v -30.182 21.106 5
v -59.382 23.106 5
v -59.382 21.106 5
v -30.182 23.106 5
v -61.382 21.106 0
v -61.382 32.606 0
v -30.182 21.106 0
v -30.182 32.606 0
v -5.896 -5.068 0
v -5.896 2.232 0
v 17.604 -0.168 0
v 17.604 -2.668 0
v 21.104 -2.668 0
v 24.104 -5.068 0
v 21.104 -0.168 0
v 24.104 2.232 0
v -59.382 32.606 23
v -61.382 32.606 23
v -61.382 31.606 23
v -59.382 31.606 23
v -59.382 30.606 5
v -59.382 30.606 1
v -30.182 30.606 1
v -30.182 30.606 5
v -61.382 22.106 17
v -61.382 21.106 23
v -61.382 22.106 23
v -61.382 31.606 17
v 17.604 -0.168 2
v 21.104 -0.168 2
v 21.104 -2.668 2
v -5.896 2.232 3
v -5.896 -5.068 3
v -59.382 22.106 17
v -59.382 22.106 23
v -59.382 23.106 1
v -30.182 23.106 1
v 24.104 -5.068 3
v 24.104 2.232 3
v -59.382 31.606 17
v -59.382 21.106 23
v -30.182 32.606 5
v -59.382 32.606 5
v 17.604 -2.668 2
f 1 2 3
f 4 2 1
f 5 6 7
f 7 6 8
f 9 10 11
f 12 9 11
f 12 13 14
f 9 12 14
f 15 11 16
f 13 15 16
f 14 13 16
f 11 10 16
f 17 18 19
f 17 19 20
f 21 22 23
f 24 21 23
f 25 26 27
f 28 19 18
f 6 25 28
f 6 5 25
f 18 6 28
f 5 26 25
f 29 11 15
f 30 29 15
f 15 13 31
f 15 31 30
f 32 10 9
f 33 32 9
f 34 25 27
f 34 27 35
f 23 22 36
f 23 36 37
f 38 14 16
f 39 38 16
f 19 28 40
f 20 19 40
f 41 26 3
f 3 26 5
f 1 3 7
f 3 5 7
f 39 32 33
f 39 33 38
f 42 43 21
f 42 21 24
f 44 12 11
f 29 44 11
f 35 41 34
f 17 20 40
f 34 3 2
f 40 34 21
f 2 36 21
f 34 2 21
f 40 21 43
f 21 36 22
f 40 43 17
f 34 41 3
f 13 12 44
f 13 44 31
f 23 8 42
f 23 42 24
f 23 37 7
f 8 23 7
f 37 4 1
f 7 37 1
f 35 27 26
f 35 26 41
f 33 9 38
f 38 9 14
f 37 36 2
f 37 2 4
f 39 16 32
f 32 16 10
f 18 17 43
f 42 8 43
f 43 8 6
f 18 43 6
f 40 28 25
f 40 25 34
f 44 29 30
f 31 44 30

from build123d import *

# Parameters (mm, degrees)
F0_W      = 3.5
F0_H      = 2.5
F1_DEPTH  = 3
F2_DEPTH  = 2
F3_W      = 33.2
F3_H      = 11.5
F3_W_2    = 29.2
F3_H_2    = 7.5
F4_DEPTH  = 5
F5_DEPTH  = 1
F7_DEPTH  = 5
F8_DEPTH  = 12
F9_W      = 2
F9_H      = 1
F10_DEPTH = 6


with BuildPart() as f1:
    # F0 (on Top) → F1 (new body)
    with BuildSketch(Plane.XY):
        Polygon((17.6036984033, 2.2320148691), (-5.8963015967, 2.2320148691), (-5.8963015967, -5.0679851309), (17.6036984033, -5.0679851309), (17.6036984033, -2.6679851309), (17.6036984033, -0.1679851309), align=None)
        Polygon((24.1036984033, 2.2320148691), (17.6036984033, 2.2320148691), (17.6036984033, -0.1679851309), (21.1036984033, -0.1679851309), (21.1036984033, -2.6679851309), (17.6036984033, -2.6679851309), (17.6036984033, -5.0679851309), (24.1036984033, -5.0679851309), align=None)
        with Locations((19.3536984033, -1.4179851309)):
            Rectangle(F0_W, F0_H)
    extrude(amount=F1_DEPTH)

    # F0 (on Top) → F2 (cut)
    with BuildSketch(Plane.XY):
        with Locations((19.3536984033, -1.4179851309)):
            Rectangle(F0_W, F0_H)
    extrude(amount=F2_DEPTH, mode=Mode.SUBTRACT)


with BuildPart() as f4:
    # F3 (on Top) → F4 (new body)
    with BuildSketch(Plane.XY):
        with Locations((-44.7821782172, 26.8558953583)):
            Rectangle(F3_W, F3_H)
        with Locations((-44.7821782172, 26.8558953583)):
            Rectangle(F3_W_2, F3_H_2, mode=Mode.SUBTRACT)
    extrude(amount=F4_DEPTH)

    # F3 (on Top) → F5 (join)
    with BuildSketch(Plane.XY):
        with Locations((-44.7821782172, 26.8558953583)):
            Rectangle(F3_W_2, F3_H_2)
    extrude(amount=F5_DEPTH)

    # F6 (on face) → F7 (cut)
    with BuildSketch(Plane.XY.offset(5)):
        Polygon((-30.1821782172, 32.6058953583), (-30.1821782172, 30.6058953583), (-30.1821782172, 23.1058953583), (-30.1821782172, 21.1058953583), (-28.1821782172, 21.1058953583), (-28.1821782172, 32.6058953583), align=None)
    extrude(amount=-F7_DEPTH, mode=Mode.SUBTRACT)

    # F6 (on face) → F8 (join)
    with BuildSketch(Plane.XY.offset(5)):
        Polygon((-59.3821782172, 23.1058953583), (-59.3821782172, 30.6058953583), (-59.3821782172, 32.6058953583), (-61.3821782172, 32.6058953583), (-61.3821782172, 21.1058953583), (-59.3821782172, 21.1058953583), align=None)
    extrude(amount=F8_DEPTH)

    # F9 (on face) → F10 (join)
    with BuildSketch(Plane.XY.offset(17)):
        with Locations((-60.3821782172, 21.6058953583)):
            Rectangle(F9_W, F9_H)
        with Locations((-60.3821782172, 32.1058953583)):
            Rectangle(F9_W, F9_H)
    extrude(amount=F10_DEPTH)


solid = Compound([f1.part, f4.part])
